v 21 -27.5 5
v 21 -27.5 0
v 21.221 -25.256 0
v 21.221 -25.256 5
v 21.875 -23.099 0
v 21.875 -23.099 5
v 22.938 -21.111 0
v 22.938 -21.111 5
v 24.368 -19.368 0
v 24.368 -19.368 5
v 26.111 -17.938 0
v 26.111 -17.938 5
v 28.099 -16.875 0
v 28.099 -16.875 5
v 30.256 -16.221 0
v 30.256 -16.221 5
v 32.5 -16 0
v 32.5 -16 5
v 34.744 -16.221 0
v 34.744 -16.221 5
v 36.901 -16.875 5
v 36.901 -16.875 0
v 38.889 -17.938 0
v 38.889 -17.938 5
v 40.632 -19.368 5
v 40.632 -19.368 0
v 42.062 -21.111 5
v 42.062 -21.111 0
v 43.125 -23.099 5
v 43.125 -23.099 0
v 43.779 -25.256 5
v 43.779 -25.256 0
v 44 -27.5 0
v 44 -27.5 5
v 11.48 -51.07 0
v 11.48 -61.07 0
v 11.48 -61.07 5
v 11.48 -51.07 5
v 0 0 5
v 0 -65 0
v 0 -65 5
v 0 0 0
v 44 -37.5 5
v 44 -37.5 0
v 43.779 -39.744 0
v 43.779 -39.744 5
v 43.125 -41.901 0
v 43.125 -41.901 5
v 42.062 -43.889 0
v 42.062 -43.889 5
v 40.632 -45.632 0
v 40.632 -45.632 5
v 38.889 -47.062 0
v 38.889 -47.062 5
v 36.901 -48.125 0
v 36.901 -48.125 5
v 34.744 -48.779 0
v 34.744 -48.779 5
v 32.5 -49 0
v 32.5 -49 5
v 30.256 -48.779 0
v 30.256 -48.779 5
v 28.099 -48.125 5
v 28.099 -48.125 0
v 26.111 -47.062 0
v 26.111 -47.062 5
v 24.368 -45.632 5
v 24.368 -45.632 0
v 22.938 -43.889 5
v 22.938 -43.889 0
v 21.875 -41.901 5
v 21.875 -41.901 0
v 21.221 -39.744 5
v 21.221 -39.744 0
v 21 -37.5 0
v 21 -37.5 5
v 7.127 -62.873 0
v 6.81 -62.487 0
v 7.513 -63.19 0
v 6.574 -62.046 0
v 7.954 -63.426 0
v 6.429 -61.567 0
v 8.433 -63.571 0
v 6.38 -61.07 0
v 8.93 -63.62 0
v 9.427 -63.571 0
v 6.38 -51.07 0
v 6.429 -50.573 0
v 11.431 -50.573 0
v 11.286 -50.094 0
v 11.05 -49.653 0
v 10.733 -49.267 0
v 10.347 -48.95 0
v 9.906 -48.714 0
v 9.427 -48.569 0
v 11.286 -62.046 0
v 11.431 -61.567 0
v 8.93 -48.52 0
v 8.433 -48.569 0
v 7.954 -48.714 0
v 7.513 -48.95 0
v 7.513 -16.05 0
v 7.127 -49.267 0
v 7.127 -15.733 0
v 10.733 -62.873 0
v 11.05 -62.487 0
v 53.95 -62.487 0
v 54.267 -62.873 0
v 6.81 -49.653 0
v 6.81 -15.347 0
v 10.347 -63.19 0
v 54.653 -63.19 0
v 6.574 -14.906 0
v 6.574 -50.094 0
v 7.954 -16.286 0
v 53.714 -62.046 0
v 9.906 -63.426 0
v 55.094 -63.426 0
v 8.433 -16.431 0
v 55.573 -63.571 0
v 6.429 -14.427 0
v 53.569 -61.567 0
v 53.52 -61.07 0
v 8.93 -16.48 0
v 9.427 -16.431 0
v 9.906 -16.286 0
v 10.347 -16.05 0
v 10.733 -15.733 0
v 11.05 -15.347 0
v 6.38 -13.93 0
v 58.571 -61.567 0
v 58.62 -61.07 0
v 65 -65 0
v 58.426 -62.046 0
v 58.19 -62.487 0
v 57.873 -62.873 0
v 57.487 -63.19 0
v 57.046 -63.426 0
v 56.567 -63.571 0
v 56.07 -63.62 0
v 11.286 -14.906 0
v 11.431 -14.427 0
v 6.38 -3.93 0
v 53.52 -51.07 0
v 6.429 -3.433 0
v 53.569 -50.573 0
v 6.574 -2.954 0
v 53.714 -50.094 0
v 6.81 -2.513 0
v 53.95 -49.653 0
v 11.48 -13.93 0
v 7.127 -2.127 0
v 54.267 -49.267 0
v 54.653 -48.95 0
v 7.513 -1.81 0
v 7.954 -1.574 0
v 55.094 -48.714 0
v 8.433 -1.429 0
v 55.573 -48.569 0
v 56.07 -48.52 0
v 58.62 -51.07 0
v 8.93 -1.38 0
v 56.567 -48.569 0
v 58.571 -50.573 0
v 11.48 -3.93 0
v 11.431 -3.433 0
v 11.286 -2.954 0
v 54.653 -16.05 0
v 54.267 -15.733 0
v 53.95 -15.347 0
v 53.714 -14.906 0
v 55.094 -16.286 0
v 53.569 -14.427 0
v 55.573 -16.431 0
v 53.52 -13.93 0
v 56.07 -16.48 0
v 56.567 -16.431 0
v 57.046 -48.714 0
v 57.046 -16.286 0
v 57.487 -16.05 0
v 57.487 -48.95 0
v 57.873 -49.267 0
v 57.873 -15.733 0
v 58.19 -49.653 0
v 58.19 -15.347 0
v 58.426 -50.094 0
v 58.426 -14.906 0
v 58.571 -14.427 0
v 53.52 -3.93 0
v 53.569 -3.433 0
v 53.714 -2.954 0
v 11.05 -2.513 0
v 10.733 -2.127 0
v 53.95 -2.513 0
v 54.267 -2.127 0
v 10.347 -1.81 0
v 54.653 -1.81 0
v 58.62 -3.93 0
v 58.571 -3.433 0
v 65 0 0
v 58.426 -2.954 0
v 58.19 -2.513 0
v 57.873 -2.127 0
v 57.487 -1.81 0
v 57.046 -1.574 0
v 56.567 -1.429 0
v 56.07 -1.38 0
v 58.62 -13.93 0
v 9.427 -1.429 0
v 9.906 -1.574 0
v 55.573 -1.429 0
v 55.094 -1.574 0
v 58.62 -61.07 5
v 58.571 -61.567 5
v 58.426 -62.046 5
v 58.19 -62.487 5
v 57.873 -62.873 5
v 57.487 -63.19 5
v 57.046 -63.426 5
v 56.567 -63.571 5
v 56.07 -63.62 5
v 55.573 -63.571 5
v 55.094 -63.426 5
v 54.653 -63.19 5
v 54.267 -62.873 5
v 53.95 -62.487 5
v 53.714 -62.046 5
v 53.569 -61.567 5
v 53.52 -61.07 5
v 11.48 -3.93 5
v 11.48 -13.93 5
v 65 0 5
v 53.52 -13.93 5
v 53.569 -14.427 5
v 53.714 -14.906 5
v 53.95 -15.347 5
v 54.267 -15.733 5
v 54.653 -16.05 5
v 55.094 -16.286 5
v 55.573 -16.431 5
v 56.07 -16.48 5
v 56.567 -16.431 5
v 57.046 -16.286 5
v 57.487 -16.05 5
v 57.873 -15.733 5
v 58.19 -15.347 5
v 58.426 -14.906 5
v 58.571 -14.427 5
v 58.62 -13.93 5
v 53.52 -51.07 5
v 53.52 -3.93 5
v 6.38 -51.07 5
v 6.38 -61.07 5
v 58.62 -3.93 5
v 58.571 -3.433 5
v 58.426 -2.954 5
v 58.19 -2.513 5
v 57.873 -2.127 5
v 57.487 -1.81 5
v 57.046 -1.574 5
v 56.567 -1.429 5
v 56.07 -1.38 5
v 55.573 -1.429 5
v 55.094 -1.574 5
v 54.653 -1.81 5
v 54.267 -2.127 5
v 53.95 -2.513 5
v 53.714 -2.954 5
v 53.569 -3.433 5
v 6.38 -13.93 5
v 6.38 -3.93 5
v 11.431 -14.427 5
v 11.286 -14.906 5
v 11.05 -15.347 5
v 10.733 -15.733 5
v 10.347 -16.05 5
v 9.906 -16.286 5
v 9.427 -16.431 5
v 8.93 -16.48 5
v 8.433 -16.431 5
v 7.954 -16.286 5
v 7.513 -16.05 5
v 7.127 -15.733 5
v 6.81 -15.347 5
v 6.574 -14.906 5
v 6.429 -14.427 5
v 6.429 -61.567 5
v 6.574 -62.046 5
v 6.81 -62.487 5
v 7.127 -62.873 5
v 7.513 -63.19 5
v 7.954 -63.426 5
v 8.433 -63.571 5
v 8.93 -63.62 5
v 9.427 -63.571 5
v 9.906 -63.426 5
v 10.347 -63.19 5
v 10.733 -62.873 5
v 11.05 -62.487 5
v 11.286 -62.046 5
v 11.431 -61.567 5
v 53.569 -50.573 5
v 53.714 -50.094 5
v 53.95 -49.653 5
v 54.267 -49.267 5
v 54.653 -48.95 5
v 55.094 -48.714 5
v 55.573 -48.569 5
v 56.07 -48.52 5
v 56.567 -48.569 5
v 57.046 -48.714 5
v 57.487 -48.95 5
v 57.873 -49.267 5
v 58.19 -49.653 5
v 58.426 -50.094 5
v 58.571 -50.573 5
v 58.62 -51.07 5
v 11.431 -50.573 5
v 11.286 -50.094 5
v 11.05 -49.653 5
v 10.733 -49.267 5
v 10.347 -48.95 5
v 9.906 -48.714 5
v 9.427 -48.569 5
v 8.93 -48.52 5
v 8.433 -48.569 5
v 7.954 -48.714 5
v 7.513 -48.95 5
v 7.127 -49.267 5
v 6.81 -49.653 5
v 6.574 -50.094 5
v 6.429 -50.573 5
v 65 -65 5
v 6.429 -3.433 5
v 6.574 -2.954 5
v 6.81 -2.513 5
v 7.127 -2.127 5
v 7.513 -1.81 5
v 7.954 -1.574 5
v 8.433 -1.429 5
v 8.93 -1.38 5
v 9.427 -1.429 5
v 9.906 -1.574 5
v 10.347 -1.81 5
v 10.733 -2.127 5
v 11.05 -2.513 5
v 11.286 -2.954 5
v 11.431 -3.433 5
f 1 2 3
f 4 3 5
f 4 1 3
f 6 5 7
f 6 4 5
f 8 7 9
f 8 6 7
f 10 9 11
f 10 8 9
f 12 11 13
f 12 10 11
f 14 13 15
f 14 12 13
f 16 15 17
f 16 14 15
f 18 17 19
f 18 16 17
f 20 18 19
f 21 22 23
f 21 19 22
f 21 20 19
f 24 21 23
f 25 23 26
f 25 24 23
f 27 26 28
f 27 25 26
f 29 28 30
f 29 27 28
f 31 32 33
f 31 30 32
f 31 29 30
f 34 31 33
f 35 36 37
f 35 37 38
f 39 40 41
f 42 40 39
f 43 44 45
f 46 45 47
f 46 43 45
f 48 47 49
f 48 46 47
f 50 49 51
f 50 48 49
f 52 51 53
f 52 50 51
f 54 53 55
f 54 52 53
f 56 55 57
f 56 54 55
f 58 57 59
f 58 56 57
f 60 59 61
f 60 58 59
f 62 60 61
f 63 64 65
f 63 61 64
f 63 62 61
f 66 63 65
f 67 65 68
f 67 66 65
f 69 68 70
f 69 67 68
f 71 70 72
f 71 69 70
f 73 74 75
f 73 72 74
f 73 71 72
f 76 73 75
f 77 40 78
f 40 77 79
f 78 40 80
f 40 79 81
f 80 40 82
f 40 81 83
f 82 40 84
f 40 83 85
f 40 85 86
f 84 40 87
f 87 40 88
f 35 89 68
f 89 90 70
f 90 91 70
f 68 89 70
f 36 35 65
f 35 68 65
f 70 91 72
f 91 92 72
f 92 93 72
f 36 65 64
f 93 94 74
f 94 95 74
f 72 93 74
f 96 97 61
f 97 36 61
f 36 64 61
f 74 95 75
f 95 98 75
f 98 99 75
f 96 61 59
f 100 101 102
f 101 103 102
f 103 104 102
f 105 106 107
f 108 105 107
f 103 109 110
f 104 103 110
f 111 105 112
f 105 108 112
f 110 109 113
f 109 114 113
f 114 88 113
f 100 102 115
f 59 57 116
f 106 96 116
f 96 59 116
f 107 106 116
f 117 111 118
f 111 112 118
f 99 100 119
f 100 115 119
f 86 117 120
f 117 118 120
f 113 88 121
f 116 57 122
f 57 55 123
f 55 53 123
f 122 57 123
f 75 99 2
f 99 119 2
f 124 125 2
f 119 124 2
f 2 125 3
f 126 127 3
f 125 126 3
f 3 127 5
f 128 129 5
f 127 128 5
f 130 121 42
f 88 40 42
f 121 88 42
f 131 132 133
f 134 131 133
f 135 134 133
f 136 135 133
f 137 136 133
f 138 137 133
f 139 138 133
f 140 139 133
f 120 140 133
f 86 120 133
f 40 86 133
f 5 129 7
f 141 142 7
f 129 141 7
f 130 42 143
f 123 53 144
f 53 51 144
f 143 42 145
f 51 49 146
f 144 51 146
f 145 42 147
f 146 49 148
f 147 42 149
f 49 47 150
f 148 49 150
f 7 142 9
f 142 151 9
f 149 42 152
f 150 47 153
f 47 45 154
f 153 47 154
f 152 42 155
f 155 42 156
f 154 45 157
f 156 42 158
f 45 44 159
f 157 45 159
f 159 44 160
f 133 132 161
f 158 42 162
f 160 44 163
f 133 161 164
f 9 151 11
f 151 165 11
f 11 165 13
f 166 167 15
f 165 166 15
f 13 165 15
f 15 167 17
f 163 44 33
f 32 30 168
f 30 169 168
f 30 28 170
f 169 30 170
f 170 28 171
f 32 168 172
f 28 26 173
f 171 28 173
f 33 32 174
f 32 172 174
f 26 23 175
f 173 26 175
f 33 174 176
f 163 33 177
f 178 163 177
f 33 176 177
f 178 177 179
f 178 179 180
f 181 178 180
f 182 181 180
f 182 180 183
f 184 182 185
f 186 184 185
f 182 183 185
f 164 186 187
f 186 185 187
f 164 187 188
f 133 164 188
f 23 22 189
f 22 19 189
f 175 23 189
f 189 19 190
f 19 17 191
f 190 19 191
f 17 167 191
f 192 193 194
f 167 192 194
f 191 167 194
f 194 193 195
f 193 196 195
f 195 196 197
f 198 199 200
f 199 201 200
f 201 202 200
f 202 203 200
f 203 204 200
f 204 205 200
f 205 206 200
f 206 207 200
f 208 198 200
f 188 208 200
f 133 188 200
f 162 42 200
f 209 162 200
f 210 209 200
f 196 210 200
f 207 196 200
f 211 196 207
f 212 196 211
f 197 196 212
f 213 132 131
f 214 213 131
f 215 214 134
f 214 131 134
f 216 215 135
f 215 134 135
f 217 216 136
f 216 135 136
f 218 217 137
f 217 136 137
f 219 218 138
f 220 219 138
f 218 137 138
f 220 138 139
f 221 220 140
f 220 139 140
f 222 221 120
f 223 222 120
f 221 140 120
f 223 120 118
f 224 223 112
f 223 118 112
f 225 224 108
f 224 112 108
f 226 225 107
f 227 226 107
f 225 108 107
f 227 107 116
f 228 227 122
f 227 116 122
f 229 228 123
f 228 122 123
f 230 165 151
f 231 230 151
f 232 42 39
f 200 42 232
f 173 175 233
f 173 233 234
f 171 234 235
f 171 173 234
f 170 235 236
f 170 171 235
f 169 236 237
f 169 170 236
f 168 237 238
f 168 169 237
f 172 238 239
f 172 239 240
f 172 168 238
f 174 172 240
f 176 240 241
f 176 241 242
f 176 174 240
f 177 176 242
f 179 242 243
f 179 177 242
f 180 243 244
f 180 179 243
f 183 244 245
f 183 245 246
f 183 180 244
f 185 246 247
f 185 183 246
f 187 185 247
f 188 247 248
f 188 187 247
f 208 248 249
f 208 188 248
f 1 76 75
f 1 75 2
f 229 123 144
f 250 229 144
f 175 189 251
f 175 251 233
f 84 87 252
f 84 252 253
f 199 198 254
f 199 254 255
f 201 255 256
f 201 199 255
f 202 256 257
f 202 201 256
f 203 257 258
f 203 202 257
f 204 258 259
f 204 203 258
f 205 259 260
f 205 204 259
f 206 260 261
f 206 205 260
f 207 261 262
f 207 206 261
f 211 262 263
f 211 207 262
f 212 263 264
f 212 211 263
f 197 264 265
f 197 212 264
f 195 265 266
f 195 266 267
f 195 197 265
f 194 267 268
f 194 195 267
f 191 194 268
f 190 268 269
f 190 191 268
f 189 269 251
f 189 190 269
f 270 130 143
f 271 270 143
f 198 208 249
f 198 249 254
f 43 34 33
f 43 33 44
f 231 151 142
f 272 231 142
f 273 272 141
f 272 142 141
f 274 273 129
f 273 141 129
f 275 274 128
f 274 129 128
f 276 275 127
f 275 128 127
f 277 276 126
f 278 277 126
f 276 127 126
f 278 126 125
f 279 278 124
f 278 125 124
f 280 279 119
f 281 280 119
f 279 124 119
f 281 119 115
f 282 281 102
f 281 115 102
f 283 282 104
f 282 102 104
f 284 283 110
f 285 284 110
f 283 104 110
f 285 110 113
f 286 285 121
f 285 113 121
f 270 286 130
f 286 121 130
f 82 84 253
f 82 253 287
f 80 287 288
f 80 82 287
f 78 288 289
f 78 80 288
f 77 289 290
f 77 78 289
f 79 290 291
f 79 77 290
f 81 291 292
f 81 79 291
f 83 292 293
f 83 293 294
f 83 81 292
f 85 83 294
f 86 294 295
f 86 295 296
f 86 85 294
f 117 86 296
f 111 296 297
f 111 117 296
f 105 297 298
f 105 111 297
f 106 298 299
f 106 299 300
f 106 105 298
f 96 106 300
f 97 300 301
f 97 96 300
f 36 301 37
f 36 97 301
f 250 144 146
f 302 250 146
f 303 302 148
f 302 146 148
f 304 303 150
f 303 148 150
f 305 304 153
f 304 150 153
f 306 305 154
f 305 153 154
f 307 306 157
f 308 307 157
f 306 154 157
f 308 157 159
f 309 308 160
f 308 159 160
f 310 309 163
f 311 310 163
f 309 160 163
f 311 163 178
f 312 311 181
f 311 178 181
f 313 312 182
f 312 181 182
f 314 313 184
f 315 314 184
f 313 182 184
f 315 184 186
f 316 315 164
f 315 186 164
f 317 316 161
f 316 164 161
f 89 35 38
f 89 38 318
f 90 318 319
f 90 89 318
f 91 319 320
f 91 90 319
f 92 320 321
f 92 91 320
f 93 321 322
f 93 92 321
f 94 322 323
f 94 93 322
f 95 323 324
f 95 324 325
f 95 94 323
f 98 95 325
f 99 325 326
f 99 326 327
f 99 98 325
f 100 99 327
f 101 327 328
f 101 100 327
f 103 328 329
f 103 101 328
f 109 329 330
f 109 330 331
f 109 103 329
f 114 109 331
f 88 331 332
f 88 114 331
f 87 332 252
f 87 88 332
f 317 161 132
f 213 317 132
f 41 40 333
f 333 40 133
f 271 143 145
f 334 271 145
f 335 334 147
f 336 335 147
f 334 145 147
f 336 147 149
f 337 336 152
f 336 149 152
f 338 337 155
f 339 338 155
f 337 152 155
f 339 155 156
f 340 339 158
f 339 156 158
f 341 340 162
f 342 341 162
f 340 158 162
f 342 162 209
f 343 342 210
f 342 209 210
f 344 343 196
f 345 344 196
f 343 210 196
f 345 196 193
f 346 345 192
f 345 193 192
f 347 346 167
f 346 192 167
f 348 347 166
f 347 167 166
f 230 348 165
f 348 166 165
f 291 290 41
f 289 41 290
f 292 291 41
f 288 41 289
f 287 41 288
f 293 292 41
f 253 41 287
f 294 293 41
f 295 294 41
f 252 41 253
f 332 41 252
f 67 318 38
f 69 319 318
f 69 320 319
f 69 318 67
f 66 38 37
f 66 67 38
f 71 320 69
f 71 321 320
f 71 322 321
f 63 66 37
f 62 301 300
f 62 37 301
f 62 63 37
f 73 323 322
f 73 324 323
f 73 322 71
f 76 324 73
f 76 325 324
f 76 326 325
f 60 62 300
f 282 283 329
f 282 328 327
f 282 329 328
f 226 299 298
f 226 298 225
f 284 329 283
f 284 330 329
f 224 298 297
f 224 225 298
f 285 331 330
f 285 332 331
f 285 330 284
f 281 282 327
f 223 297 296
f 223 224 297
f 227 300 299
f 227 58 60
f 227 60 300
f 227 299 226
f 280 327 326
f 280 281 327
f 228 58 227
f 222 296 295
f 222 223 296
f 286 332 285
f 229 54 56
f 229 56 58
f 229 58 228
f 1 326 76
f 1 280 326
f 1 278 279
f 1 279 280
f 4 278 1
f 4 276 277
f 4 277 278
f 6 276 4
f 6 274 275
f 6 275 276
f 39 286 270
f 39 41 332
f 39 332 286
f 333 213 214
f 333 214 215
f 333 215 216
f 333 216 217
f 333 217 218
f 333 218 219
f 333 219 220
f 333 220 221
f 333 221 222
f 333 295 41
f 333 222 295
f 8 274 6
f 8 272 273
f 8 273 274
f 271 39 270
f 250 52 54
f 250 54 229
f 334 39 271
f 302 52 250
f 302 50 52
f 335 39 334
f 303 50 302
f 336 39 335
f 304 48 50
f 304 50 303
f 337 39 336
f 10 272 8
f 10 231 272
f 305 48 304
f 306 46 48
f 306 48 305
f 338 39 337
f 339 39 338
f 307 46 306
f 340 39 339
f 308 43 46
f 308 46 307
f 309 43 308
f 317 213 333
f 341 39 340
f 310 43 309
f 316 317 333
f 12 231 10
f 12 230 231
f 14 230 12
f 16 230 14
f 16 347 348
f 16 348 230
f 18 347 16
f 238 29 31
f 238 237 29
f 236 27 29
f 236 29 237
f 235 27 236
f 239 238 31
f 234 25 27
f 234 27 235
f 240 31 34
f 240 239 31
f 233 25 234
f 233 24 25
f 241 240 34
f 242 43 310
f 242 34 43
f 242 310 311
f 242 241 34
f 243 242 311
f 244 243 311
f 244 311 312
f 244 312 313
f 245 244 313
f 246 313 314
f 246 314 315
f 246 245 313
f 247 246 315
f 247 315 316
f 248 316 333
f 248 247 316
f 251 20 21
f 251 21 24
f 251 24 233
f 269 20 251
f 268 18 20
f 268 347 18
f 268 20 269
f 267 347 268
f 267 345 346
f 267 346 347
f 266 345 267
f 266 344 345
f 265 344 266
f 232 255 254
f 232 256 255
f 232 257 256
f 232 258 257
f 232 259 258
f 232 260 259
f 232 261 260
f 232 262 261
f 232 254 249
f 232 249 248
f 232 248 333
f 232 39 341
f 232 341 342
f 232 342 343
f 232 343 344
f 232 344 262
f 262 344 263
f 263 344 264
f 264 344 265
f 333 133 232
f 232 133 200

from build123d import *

# Parameters (mm, degrees)
SKETCH1_W           = 65
SKETCH1_H           = 65
BOSS_EXTRUDE1_DEPTH = 5
CUT_EXTRUDE2_REACH  = 94.06


with BuildPart() as part:
    # Sketch1 → Boss-Extrude1 (new body)
    with BuildSketch(Plane.XY):
        with Locations((32.5, -32.5)):
            Rectangle(SKETCH1_W, SKETCH1_H)
        with BuildLine():
            Line((11.48, -3.93), (11.48, -13.93))
            ThreePointArc((11.48, -13.93), (8.93, -16.48), (6.38, -13.93))
            Line((6.38, -13.93), (6.38, -3.93))
            ThreePointArc((6.38, -3.93), (8.93, -1.38), (11.48, -3.93))
        make_face(mode=Mode.SUBTRACT)
        with BuildLine():
            Line((53.52, -3.93), (53.52, -13.93))
            ThreePointArc((53.52, -13.93), (56.07, -16.48), (58.62, -13.93))
            Line((58.62, -13.93), (58.62, -3.93))
            ThreePointArc((58.62, -3.93), (56.07, -1.38), (53.52, -3.93))
        make_face(mode=Mode.SUBTRACT)
        with BuildLine():
            Line((11.48, -61.07), (11.48, -51.07))
            ThreePointArc((11.48, -51.07), (8.93, -48.52), (6.38, -51.07))
            Line((6.38, -51.07), (6.38, -61.07))
            ThreePointArc((6.38, -61.07), (8.93, -63.62), (11.48, -61.07))
        make_face(mode=Mode.SUBTRACT)
        with BuildLine():
            Line((53.52, -61.07), (53.52, -51.07))
            ThreePointArc((53.52, -51.07), (56.07, -48.52), (58.62, -51.07))
            Line((58.62, -51.07), (58.62, -61.07))
            ThreePointArc((58.62, -61.07), (56.07, -63.62), (53.52, -61.07))
        make_face(mode=Mode.SUBTRACT)
    extrude(amount=BOSS_EXTRUDE1_DEPTH)

    # Sketch2 → Cut-Extrude2 (cut, up to next)
    with BuildSketch(Plane.XY.offset(5), mode=Mode.PRIVATE) as cut_extrude2_sk1:
        with BuildLine():
            Line((44, -27.5), (44, -37.5))
            ThreePointArc((44, -37.5), (32.5, -49), (21, -37.5))
            Line((21, -37.5), (21, -27.5))
            ThreePointArc((21, -27.5), (32.5, -16), (44, -27.5))
        make_face()
    cut_extrude2_tool1 = extrude(cut_extrude2_sk1.sketch, amount=-CUT_EXTRUDE2_REACH, mode=Mode.PRIVATE) & part.part
    add(cut_extrude2_tool1.solids().sort_by_distance((32.5, -32.5, 5))[0], mode=Mode.SUBTRACT)


solid = part.part
